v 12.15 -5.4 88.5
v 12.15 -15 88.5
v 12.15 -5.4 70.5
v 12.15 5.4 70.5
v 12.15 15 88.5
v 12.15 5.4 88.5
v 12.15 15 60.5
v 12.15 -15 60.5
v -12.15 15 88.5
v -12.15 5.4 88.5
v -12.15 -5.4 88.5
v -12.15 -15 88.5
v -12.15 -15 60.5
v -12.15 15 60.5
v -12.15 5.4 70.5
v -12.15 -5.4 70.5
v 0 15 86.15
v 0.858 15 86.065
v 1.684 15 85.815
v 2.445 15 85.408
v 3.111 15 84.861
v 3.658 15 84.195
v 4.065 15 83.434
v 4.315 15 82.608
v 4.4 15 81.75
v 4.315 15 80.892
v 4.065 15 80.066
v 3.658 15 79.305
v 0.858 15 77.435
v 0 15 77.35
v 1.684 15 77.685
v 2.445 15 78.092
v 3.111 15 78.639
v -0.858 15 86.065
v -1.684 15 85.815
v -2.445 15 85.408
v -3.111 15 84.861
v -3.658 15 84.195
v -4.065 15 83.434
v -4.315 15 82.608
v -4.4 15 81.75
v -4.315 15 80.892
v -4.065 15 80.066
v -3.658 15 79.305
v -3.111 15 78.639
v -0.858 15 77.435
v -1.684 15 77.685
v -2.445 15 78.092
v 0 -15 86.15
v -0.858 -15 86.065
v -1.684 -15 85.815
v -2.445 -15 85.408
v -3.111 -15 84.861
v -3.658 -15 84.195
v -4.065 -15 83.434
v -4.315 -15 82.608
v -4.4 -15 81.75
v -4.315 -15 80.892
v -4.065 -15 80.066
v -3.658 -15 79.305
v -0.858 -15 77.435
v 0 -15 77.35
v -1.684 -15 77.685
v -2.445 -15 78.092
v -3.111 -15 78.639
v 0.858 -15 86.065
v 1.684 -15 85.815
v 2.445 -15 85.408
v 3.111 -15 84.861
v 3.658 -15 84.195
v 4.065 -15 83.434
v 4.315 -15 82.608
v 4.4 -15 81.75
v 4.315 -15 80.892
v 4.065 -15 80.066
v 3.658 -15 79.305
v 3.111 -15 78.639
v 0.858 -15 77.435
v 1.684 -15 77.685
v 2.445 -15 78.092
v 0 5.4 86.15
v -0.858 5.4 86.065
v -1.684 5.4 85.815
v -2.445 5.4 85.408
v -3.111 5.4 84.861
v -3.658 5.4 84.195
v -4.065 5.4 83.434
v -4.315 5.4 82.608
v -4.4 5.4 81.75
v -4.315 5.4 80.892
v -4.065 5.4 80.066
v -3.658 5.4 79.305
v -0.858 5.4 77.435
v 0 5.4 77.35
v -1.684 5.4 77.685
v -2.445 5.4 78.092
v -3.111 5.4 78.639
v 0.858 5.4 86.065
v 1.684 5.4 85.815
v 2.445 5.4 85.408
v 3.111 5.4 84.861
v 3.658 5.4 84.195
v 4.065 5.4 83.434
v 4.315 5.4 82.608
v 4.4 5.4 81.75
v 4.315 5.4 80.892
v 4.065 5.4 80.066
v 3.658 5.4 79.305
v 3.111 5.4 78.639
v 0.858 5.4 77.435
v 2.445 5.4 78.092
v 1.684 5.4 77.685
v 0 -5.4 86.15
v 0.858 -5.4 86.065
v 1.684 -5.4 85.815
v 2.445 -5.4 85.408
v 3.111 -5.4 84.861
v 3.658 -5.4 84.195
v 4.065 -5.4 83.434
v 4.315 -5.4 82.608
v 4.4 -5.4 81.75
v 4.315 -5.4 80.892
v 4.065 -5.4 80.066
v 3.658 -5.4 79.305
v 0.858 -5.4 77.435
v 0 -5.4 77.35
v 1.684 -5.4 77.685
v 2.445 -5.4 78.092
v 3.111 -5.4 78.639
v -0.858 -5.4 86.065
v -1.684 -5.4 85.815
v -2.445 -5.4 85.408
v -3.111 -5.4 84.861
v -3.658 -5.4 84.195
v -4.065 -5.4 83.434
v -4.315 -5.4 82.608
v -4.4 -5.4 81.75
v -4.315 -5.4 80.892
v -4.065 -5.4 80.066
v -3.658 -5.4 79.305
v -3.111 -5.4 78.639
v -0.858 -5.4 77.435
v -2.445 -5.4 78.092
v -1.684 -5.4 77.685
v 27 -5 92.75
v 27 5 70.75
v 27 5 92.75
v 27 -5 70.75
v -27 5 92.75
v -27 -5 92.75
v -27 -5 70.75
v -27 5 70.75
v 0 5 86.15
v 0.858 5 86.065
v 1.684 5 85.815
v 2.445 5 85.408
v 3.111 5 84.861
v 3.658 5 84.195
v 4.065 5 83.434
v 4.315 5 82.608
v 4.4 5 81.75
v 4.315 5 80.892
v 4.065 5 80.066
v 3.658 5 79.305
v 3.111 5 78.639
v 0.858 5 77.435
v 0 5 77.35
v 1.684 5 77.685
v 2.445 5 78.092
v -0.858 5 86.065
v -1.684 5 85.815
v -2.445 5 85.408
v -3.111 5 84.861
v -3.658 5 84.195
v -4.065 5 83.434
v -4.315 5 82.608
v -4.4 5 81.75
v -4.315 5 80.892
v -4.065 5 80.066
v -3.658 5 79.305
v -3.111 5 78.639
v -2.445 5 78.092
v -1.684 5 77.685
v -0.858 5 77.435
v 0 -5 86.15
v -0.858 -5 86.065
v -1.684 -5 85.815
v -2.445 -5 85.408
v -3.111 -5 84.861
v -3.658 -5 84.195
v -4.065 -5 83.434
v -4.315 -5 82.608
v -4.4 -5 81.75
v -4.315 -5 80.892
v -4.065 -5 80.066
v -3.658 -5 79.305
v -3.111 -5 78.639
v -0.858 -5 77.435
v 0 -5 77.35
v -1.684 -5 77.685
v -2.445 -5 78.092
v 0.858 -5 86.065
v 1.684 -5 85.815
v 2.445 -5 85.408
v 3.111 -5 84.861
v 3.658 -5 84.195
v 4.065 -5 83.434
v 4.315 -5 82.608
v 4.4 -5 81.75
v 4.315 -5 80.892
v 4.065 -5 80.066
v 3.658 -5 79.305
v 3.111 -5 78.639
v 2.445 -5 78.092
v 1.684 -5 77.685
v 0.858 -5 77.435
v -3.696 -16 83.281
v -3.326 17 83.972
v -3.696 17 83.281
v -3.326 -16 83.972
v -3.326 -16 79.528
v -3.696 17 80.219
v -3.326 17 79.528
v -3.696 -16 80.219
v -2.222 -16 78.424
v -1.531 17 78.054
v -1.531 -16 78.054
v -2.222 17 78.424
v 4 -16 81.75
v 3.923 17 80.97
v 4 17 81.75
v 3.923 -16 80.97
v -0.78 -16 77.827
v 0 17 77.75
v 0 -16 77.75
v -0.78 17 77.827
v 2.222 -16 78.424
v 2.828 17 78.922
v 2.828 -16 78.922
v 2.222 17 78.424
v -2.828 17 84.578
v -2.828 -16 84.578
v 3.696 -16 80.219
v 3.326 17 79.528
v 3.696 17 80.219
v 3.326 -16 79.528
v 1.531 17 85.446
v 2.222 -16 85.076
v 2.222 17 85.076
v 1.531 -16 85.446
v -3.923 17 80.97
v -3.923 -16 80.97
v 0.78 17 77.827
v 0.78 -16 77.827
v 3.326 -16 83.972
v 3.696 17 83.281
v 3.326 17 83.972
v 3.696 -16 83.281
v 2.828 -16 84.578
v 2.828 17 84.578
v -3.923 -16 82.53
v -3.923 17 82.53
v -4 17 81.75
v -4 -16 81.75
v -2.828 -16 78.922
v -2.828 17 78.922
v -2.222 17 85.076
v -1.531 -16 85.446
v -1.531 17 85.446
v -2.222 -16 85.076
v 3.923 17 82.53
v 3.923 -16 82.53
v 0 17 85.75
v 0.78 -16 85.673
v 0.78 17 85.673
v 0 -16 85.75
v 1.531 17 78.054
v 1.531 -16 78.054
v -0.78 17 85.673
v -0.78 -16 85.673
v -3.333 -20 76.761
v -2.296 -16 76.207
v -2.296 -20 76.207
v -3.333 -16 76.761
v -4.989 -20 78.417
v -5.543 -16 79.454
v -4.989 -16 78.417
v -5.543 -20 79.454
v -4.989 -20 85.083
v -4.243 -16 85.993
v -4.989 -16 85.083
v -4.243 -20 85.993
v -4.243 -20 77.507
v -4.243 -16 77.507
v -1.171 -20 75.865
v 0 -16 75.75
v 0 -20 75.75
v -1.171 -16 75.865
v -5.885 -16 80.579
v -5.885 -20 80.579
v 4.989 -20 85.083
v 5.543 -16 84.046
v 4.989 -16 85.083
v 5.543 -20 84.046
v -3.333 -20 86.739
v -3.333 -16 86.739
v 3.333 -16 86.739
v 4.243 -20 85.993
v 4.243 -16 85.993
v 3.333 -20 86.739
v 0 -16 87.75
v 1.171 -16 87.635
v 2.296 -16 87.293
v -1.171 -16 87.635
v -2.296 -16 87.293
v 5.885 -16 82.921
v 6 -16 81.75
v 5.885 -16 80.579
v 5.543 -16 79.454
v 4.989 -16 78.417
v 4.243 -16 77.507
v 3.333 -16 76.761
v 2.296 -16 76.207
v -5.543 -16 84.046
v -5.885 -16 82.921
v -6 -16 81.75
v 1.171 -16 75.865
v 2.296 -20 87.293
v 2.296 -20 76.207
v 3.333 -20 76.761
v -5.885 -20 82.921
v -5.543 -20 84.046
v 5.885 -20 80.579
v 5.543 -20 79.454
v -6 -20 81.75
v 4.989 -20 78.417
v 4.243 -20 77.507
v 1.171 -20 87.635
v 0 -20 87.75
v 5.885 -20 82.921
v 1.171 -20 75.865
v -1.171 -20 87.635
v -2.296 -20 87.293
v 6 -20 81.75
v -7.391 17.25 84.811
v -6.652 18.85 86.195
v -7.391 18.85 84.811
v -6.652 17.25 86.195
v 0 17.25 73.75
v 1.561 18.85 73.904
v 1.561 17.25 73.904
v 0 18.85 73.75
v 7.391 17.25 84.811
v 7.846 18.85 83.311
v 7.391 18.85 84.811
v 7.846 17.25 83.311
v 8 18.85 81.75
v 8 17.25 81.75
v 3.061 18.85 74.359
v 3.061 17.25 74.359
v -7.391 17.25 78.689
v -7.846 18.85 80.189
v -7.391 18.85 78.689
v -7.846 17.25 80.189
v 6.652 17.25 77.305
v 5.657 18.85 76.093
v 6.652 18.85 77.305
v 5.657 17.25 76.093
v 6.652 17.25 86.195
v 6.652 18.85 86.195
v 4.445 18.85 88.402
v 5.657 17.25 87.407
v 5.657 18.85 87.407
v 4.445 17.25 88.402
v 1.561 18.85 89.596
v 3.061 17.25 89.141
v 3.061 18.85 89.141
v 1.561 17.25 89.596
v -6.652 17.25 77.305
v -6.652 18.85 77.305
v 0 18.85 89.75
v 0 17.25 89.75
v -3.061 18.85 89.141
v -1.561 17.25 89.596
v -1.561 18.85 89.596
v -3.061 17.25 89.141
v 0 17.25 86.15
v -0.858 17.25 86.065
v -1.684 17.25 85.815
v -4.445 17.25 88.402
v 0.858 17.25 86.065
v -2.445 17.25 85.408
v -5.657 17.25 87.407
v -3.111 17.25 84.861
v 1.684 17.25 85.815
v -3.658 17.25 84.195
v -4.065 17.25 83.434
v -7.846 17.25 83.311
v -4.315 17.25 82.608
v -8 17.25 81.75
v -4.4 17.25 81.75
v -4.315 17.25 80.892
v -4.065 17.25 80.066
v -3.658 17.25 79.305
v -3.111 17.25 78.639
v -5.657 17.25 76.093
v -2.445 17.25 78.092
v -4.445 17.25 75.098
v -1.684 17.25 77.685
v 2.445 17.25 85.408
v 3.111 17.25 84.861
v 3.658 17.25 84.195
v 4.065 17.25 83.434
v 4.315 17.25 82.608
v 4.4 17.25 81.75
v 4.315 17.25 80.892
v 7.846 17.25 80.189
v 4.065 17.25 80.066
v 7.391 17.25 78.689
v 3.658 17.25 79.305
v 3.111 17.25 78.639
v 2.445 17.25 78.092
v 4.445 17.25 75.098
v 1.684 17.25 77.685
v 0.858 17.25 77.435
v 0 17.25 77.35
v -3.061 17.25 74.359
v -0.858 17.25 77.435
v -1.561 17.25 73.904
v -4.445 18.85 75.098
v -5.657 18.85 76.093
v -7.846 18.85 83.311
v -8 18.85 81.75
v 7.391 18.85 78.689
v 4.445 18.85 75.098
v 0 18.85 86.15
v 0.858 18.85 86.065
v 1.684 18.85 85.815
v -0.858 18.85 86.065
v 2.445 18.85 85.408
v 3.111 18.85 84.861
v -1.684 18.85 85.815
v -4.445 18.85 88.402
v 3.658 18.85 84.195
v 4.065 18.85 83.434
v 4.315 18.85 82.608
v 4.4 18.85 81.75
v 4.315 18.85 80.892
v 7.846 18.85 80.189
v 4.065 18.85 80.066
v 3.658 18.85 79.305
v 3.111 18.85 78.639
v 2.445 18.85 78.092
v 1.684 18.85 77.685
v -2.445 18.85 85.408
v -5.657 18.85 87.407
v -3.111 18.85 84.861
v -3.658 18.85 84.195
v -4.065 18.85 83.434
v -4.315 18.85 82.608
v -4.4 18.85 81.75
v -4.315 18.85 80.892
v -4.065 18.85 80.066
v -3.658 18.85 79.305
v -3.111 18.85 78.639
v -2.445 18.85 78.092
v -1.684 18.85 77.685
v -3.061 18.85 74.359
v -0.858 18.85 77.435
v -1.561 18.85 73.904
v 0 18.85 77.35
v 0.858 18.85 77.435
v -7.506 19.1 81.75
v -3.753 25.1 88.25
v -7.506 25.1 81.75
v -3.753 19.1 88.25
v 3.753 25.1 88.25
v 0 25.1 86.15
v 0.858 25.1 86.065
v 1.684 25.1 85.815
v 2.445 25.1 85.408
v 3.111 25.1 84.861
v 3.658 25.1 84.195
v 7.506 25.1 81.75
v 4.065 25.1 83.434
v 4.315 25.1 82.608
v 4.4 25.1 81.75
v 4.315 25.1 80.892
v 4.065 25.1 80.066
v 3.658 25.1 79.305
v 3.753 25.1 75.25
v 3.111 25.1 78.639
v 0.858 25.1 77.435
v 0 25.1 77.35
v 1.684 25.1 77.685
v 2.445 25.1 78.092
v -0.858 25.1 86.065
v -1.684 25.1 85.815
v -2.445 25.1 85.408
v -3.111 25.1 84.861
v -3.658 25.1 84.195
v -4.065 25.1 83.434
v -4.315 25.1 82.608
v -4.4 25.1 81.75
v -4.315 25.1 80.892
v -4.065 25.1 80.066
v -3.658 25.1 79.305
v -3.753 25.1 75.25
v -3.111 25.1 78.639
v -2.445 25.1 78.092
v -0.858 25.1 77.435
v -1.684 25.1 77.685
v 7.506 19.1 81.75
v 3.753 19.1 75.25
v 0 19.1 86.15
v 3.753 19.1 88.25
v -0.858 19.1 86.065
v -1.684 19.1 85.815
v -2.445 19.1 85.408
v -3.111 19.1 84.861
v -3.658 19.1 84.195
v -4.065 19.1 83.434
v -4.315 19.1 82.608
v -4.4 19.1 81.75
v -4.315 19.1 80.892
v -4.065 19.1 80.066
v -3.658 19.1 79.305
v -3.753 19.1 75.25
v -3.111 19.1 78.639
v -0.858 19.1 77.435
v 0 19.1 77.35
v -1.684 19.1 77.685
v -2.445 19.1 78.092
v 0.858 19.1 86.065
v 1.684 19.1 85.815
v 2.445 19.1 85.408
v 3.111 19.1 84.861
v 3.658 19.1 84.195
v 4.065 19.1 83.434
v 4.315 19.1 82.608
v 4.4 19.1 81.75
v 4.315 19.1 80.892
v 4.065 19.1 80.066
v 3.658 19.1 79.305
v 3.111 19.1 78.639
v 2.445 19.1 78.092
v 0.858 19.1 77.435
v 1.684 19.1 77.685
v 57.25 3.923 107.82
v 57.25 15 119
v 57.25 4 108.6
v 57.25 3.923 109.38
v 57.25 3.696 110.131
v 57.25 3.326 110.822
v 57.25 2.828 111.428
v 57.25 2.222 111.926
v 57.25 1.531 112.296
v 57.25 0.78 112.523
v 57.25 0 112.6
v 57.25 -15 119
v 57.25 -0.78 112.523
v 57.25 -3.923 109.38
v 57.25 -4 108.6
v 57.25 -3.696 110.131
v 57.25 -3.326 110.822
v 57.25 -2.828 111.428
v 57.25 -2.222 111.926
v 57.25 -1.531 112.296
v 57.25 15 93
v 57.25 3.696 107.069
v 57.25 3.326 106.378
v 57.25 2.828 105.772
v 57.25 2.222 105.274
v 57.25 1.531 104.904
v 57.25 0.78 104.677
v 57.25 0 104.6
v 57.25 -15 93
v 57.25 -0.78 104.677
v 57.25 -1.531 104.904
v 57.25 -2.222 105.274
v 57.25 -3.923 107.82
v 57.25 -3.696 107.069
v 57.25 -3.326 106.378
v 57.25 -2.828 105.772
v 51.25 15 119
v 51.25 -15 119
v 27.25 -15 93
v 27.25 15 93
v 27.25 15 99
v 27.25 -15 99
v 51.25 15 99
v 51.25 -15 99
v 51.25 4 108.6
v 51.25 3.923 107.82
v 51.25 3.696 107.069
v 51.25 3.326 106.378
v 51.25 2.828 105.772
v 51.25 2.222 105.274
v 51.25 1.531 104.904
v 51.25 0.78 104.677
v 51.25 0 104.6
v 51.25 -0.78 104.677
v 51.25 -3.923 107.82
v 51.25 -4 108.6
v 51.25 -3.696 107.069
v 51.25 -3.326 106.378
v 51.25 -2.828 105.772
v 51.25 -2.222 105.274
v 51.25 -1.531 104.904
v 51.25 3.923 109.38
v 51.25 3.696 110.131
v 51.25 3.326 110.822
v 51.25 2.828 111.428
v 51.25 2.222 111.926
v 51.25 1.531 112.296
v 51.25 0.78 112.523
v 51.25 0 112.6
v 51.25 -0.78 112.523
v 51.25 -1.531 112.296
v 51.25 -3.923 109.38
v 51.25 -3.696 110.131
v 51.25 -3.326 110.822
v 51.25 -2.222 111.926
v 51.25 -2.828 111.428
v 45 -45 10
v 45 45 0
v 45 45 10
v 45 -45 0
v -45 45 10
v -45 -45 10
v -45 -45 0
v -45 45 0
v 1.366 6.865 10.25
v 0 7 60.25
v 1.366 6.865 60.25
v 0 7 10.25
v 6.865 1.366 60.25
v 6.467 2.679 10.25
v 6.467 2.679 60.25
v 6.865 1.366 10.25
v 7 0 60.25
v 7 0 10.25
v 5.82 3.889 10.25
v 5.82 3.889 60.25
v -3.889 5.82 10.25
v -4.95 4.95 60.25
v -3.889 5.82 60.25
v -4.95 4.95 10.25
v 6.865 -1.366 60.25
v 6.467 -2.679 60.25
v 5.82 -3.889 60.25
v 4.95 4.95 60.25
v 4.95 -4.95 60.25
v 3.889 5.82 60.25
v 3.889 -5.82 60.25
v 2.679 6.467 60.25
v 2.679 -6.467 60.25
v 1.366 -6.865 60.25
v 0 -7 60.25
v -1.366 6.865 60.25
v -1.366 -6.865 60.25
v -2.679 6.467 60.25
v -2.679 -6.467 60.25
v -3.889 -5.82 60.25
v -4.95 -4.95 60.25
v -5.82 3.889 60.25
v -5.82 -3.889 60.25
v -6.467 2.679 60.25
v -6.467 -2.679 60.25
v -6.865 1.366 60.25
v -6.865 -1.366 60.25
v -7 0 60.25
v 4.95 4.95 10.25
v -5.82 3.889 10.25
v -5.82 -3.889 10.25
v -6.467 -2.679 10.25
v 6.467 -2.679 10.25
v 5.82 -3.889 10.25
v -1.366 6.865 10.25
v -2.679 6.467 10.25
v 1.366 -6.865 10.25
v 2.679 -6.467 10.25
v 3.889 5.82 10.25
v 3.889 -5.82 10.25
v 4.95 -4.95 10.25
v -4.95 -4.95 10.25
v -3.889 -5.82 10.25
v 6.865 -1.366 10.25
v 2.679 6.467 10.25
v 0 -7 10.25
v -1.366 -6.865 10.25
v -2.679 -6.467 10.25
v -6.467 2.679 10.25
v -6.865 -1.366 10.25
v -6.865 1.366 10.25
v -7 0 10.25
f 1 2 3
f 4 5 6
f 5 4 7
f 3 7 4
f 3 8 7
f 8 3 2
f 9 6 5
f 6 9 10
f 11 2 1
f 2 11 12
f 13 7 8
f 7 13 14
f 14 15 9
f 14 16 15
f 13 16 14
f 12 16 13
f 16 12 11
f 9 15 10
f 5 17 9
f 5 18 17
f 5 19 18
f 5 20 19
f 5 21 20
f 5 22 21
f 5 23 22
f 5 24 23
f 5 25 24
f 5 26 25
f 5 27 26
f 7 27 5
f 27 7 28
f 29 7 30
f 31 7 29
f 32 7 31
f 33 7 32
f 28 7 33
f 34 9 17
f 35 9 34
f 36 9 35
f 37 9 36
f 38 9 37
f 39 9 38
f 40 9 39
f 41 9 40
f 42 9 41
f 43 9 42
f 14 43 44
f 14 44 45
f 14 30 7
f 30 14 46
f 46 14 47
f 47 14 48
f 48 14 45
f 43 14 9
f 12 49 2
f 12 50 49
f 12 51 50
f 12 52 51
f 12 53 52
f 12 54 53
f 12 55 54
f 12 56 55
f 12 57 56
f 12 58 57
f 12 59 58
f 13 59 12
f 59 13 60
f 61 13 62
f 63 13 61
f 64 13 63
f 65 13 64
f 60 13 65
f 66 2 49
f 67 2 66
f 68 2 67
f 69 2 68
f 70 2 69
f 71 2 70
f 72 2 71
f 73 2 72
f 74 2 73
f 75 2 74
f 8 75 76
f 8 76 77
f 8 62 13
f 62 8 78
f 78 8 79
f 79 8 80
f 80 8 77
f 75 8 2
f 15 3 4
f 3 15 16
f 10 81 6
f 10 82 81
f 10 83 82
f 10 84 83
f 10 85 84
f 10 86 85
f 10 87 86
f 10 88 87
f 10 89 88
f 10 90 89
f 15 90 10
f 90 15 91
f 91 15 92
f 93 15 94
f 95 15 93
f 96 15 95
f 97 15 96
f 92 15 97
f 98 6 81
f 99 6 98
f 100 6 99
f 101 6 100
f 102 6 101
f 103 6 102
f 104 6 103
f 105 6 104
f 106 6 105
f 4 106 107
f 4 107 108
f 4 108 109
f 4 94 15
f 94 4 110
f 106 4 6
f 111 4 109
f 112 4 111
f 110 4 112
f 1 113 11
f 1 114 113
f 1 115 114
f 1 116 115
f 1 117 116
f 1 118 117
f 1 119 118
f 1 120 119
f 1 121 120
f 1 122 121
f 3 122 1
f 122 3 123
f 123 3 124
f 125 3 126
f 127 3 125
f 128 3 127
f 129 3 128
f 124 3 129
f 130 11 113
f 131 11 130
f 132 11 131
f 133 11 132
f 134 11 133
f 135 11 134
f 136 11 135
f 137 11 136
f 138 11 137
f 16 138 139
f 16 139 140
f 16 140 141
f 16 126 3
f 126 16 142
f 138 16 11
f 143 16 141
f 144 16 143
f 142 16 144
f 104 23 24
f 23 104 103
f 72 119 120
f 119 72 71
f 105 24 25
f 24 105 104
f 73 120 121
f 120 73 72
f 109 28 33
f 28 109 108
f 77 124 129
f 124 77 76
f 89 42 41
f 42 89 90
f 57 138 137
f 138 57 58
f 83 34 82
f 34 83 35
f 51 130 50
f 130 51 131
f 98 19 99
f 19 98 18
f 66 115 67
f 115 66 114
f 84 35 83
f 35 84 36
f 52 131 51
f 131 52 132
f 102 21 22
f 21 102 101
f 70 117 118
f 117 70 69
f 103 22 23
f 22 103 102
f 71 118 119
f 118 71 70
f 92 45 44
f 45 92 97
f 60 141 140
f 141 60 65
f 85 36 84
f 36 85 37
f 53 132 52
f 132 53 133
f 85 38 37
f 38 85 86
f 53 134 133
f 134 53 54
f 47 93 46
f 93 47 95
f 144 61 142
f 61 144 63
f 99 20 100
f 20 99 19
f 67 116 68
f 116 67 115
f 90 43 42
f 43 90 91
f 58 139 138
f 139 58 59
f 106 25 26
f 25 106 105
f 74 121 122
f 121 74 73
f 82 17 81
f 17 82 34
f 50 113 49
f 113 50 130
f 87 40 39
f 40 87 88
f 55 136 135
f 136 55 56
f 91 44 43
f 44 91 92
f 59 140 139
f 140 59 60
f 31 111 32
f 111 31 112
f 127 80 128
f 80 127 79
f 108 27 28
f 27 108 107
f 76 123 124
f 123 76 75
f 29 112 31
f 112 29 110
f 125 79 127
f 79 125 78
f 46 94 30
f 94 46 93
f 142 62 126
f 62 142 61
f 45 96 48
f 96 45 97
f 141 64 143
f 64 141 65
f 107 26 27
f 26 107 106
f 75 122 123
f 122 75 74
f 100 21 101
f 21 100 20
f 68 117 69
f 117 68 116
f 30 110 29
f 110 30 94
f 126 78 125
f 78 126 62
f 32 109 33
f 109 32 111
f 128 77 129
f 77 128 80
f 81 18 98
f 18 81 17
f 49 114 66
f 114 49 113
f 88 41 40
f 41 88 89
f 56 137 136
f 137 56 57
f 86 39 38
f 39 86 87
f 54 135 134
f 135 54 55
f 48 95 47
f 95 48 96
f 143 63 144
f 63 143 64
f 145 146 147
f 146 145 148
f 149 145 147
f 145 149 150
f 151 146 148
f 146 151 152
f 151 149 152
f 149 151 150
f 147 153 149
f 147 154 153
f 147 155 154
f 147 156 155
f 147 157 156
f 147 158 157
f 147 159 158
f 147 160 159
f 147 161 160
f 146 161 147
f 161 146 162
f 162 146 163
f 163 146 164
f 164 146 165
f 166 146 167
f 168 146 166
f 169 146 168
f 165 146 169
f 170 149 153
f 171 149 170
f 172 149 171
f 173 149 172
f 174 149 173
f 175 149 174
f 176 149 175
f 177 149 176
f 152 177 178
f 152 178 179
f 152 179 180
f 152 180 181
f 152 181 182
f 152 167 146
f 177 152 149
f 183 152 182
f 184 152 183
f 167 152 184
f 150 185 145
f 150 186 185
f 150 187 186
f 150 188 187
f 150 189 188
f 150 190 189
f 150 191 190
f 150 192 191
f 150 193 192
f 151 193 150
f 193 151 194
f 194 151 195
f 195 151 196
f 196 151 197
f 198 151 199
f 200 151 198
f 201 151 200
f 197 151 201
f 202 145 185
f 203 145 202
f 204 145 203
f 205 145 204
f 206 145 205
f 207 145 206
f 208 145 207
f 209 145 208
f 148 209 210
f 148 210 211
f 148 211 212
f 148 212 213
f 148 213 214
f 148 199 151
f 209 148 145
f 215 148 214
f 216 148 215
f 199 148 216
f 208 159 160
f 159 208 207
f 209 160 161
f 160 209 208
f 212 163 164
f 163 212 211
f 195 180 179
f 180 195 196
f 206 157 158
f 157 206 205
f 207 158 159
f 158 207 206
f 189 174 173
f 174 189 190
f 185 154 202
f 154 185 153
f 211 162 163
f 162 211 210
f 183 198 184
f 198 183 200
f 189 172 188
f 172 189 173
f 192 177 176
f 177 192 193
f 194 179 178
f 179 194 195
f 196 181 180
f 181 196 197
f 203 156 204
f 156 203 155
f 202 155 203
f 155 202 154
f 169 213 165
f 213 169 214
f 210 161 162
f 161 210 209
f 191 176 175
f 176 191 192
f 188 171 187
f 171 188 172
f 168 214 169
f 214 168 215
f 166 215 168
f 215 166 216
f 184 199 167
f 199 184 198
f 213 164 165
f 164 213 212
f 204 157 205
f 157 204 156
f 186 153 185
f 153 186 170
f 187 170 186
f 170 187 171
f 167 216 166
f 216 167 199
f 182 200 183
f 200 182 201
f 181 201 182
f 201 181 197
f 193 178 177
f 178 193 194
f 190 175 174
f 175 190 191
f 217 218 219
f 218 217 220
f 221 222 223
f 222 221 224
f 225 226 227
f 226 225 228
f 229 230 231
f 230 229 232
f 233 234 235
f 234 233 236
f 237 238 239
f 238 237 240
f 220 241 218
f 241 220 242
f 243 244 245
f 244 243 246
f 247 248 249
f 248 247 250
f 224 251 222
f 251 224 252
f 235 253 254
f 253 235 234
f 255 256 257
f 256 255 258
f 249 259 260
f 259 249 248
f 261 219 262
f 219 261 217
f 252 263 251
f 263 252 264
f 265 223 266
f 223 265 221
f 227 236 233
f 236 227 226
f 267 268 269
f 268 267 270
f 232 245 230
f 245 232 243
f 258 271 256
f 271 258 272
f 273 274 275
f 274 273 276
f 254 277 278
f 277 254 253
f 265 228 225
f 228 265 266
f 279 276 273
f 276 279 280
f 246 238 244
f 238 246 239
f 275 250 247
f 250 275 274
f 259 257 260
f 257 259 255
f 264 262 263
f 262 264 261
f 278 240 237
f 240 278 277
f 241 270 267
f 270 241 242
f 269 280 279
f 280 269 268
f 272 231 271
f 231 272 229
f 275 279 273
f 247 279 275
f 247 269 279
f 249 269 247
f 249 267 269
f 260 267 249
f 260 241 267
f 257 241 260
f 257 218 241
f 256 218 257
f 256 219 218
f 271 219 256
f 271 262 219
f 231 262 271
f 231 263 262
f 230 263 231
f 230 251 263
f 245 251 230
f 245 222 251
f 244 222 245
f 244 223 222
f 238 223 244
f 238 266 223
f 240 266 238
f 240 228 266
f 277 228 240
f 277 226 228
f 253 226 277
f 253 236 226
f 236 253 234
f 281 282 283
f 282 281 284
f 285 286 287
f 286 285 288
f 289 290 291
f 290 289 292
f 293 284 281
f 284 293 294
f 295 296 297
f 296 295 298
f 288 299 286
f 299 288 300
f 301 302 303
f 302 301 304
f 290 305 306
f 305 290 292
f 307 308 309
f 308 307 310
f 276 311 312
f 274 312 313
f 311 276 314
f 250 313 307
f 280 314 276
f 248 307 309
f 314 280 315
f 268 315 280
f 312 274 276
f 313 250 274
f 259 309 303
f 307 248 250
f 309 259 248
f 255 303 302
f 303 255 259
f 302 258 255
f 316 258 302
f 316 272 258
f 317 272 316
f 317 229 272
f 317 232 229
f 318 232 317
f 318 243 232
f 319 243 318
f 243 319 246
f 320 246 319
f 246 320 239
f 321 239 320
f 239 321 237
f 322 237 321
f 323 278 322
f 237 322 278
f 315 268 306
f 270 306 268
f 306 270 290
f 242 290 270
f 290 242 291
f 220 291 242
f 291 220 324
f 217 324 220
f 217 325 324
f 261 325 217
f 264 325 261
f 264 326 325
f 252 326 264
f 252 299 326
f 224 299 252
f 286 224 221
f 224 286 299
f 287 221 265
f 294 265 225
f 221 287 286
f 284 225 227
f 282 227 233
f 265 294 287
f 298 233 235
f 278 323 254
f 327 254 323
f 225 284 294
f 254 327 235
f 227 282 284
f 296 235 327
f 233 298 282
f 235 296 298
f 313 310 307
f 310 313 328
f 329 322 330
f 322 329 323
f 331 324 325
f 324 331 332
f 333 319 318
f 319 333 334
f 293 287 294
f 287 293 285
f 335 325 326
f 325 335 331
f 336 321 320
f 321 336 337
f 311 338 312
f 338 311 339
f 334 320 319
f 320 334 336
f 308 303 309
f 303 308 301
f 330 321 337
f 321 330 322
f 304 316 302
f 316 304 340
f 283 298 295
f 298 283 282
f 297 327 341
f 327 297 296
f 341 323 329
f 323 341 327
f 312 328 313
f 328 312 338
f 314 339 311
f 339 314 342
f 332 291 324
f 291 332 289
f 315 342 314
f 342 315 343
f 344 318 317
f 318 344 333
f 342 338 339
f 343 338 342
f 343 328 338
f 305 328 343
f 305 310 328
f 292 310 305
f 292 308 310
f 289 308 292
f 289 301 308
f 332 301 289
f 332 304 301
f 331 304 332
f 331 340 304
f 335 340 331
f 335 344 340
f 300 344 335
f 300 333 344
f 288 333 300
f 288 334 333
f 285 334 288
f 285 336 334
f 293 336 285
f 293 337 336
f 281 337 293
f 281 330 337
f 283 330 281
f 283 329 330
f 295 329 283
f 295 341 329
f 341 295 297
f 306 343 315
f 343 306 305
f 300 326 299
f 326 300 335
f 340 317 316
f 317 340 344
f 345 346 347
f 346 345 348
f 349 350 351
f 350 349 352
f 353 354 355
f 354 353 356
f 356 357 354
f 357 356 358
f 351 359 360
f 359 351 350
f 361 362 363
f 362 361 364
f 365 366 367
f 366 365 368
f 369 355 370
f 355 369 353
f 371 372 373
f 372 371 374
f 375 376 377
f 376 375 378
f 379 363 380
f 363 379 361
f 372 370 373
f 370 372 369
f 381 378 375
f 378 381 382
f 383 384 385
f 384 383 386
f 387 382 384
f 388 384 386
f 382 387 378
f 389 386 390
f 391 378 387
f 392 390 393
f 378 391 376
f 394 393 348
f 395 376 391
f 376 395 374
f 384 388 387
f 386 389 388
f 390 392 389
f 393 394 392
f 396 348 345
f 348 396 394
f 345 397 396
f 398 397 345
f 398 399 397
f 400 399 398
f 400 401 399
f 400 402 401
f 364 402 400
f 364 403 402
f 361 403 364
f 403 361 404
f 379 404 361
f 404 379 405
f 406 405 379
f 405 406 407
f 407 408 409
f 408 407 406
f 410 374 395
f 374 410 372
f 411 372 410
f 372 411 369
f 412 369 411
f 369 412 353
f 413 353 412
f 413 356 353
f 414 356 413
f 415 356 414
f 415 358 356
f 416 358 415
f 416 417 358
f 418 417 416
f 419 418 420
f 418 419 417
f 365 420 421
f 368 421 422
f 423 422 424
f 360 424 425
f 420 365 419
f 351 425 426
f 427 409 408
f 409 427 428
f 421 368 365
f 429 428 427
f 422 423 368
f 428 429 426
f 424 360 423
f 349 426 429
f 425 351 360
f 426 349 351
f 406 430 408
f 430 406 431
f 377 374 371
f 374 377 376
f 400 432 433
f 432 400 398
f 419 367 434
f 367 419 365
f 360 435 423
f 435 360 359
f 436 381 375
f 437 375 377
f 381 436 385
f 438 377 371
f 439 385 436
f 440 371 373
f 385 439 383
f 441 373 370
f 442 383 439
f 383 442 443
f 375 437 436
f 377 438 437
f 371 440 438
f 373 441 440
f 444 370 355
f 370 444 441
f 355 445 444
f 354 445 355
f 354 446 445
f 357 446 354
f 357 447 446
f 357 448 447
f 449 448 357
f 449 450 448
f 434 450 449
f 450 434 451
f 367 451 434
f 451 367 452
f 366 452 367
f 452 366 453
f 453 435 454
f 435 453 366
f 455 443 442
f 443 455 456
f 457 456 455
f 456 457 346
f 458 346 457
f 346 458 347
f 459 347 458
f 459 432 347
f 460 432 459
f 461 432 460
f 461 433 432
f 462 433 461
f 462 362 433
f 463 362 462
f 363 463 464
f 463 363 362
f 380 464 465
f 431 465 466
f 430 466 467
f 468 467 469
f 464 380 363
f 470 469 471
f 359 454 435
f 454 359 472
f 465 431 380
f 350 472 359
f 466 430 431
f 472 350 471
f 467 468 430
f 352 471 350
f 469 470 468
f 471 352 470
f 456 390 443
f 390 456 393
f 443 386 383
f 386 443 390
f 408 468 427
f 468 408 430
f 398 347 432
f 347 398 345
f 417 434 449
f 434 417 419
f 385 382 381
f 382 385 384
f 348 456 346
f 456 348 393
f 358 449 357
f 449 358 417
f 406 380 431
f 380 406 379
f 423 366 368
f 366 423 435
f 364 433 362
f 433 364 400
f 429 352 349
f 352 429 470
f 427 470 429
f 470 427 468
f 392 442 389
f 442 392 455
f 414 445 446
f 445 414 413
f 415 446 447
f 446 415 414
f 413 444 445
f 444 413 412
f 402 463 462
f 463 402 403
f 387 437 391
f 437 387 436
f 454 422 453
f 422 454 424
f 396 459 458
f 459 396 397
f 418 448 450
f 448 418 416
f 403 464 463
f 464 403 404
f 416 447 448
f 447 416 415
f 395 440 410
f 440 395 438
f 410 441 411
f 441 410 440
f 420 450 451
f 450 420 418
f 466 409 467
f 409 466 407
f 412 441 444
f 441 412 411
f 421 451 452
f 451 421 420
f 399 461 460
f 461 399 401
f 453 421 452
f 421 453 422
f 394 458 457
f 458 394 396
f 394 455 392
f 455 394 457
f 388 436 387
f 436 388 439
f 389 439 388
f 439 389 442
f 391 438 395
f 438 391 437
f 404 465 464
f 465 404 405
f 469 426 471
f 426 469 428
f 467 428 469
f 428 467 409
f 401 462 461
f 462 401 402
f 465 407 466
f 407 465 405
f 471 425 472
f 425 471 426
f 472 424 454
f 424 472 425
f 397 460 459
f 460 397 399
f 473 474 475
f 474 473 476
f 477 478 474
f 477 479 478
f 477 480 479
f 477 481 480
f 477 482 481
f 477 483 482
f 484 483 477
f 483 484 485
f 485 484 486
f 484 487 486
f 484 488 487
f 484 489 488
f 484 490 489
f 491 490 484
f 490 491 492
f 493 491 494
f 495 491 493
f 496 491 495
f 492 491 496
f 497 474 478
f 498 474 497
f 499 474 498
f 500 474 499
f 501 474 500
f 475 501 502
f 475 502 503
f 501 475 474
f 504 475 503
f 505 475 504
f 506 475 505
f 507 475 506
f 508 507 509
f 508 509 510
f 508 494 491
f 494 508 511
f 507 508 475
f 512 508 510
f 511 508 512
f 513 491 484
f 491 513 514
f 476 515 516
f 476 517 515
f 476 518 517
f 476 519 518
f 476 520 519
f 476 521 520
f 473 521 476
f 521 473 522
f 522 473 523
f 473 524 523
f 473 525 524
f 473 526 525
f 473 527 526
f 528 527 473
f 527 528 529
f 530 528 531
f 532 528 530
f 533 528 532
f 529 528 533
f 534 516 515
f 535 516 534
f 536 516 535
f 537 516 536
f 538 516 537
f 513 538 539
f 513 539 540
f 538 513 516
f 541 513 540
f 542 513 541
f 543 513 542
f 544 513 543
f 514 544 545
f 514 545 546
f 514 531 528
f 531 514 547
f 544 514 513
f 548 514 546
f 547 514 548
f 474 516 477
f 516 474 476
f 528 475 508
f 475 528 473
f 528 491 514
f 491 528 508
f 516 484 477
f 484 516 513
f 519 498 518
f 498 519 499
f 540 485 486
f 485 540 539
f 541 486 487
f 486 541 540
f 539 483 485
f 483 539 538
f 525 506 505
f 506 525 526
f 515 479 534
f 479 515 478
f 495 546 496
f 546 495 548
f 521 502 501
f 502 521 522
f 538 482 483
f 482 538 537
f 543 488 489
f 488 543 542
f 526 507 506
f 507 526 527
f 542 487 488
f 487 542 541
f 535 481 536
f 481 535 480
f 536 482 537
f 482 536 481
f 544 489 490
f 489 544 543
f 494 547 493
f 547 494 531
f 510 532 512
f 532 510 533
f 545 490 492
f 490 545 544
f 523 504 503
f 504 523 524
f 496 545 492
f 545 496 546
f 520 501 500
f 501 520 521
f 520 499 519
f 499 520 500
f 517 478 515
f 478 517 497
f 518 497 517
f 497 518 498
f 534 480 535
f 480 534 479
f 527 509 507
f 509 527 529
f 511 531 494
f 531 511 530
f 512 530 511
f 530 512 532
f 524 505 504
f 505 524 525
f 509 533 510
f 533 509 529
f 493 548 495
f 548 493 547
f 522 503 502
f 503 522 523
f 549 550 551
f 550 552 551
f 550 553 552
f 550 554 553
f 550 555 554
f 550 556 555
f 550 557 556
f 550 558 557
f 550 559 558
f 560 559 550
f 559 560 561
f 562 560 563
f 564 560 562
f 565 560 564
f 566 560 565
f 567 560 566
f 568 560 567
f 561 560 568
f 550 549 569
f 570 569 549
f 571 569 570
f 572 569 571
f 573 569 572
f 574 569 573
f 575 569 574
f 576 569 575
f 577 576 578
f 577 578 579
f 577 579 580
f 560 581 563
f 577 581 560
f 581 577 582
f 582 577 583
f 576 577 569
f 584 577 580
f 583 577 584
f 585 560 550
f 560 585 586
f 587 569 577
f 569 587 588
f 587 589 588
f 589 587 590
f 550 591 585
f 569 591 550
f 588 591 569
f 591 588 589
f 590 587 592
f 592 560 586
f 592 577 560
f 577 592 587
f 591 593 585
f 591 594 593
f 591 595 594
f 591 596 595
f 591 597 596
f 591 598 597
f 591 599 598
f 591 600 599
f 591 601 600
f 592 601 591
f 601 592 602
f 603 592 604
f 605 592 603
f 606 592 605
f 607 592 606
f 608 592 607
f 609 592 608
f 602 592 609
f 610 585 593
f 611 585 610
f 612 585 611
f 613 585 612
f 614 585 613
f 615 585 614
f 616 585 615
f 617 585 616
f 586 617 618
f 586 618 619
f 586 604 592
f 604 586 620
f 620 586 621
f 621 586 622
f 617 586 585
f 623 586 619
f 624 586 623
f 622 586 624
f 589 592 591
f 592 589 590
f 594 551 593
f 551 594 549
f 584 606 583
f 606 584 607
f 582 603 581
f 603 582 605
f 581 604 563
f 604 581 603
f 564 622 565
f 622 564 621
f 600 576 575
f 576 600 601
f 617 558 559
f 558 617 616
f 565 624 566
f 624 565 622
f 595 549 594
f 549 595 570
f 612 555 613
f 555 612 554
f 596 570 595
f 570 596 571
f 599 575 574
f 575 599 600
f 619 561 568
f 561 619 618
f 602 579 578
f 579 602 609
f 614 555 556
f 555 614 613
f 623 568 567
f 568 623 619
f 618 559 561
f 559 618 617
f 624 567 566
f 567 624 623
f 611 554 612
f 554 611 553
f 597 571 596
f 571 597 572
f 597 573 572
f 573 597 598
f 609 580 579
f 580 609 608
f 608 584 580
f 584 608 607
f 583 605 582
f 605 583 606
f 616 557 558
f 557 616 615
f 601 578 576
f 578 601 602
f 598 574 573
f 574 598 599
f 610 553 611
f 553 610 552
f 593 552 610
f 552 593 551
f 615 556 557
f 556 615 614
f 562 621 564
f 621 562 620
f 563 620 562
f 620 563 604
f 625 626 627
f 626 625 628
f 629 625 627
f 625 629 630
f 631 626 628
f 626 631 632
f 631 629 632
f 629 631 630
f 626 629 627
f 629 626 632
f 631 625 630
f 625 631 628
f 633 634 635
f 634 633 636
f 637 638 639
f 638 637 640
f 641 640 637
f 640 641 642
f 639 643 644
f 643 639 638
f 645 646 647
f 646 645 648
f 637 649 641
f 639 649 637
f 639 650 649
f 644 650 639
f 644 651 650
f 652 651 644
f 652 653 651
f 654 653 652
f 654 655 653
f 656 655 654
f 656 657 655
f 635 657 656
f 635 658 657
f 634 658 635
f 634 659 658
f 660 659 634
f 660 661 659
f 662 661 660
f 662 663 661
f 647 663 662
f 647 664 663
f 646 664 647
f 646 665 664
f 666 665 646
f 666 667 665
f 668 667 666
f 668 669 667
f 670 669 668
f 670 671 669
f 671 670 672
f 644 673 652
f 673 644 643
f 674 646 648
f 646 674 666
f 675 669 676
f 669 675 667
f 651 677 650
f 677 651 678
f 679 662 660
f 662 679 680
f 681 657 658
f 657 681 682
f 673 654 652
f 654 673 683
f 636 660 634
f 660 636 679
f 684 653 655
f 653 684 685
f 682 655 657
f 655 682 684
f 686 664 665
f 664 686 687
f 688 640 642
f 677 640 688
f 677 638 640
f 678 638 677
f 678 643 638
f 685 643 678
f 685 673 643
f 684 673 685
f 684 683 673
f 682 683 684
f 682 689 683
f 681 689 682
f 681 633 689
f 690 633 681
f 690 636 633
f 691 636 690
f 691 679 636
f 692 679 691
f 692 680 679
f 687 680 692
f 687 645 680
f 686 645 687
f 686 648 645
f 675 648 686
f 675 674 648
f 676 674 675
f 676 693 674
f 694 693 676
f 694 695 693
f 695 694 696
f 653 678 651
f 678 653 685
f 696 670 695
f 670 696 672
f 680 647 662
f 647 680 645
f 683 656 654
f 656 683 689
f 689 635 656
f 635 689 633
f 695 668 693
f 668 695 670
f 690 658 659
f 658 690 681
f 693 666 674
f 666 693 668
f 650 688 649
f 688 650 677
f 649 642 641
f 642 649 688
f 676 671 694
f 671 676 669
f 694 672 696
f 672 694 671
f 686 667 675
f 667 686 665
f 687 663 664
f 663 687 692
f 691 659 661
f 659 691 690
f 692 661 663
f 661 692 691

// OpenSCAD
$fn = 32;

// ------------------------------------------------------------------------
// Lamp arm: column d14 x 50 mm, arm 54 mm
// Every part is its own module, assembly() places every instance.
// ------------------------------------------------------------------------

// --- part 1 ---
module lamp_base() {
  difference() {
    translate([-45, -45, 0]) cube([90, 90, 10]);
  }
}

// --- part 2 ---
module lamp_column() {
  cylinder(h = 50, d = 14);
}

// --- part 3 ---
module head_fork() {
  difference() {
    translate([-12.15, -15, 0]) cube([24.3, 30, 28]);
    translate([-13.15, -5.4, 10]) cube([26.3, 10.8, 19]);
    translate([0, 0, 21.25]) rotate([90, 0, 0]) cylinder(h = 32, d = 8.8, center = true);
  }
}

// --- part 4 ---
module lamp_arm() {
  difference() {
    translate([-27, -5, 0]) cube([54, 10, 22]);
    translate([0, 0, 11]) rotate([90, 0, 0]) cylinder(h = 12, d = 8.8, center = true);
  }
}

// --- part 5 ---
module arm_pin() {
  rotate([0, 90, 0]) cylinder(h = 34, d = 8, center = true);
  translate([-20, 0, 0]) rotate([0, 90, 0]) cylinder(h = 4, d = 12);
}

// --- part 6 ---
module arm_washer() {
  difference() {
      translate([0, 0, 0]) cylinder(h = 1.6, d = 16);
      translate([0, 0, -1]) cylinder(h = 3.6, d = 8.8);
    }
}

// --- part 7 ---
module arm_nut() {
  difference() {
    linear_extrude(height = 6) polygon(points = [[7.506, 0], [3.753, 6.5], [-3.753, 6.5], [-7.506, 0], [-3.753, -6.5], [3.753, -6.5]]);
    translate([0, 0, -1]) cylinder(h = 8, d = 8.8);
  }
}

// --- part 8 ---
module shade_bracket() {
  difference() {
    translate([-15, -15, 0]) cube([30, 30, 26]);
    translate([-16, -16, 6]) cube([25, 32, 21]);
    translate([12, 0, 15.6]) rotate([0, 90, 0]) cylinder(h = 8, d = 8, center = true);
  }
}

// --- assembly ---
module assembly() {
  color([0.80, 0.24, 0.20]) translate([0, 0, 0]) rotate([0, 0, 0]) lamp_base();
  color([0.20, 0.45, 0.75]) translate([0, 0, 10.25]) rotate([0, 0, 0]) lamp_column();
  color([0.25, 0.62, 0.32]) translate([0, 0, 60.5]) rotate([0, 0, 0]) head_fork();
  color([0.92, 0.70, 0.18]) translate([0, 0, 70.75]) rotate([0, 0, 0]) lamp_arm();
  color([0.58, 0.35, 0.70]) translate([0, 0, 81.75]) rotate([0, 0, 90]) arm_pin();
  color([0.16, 0.66, 0.66]) translate([0, 18.85, 81.75]) rotate([90, 0, 0]) arm_washer();
  color([0.85, 0.48, 0.18]) translate([0, 25.1, 81.75]) rotate([90, 0, 0]) arm_nut();
  color([0.55, 0.60, 0.65]) translate([42.25, 0, 93]) rotate([0, 0, 0]) shade_bracket();
}

assembly();
